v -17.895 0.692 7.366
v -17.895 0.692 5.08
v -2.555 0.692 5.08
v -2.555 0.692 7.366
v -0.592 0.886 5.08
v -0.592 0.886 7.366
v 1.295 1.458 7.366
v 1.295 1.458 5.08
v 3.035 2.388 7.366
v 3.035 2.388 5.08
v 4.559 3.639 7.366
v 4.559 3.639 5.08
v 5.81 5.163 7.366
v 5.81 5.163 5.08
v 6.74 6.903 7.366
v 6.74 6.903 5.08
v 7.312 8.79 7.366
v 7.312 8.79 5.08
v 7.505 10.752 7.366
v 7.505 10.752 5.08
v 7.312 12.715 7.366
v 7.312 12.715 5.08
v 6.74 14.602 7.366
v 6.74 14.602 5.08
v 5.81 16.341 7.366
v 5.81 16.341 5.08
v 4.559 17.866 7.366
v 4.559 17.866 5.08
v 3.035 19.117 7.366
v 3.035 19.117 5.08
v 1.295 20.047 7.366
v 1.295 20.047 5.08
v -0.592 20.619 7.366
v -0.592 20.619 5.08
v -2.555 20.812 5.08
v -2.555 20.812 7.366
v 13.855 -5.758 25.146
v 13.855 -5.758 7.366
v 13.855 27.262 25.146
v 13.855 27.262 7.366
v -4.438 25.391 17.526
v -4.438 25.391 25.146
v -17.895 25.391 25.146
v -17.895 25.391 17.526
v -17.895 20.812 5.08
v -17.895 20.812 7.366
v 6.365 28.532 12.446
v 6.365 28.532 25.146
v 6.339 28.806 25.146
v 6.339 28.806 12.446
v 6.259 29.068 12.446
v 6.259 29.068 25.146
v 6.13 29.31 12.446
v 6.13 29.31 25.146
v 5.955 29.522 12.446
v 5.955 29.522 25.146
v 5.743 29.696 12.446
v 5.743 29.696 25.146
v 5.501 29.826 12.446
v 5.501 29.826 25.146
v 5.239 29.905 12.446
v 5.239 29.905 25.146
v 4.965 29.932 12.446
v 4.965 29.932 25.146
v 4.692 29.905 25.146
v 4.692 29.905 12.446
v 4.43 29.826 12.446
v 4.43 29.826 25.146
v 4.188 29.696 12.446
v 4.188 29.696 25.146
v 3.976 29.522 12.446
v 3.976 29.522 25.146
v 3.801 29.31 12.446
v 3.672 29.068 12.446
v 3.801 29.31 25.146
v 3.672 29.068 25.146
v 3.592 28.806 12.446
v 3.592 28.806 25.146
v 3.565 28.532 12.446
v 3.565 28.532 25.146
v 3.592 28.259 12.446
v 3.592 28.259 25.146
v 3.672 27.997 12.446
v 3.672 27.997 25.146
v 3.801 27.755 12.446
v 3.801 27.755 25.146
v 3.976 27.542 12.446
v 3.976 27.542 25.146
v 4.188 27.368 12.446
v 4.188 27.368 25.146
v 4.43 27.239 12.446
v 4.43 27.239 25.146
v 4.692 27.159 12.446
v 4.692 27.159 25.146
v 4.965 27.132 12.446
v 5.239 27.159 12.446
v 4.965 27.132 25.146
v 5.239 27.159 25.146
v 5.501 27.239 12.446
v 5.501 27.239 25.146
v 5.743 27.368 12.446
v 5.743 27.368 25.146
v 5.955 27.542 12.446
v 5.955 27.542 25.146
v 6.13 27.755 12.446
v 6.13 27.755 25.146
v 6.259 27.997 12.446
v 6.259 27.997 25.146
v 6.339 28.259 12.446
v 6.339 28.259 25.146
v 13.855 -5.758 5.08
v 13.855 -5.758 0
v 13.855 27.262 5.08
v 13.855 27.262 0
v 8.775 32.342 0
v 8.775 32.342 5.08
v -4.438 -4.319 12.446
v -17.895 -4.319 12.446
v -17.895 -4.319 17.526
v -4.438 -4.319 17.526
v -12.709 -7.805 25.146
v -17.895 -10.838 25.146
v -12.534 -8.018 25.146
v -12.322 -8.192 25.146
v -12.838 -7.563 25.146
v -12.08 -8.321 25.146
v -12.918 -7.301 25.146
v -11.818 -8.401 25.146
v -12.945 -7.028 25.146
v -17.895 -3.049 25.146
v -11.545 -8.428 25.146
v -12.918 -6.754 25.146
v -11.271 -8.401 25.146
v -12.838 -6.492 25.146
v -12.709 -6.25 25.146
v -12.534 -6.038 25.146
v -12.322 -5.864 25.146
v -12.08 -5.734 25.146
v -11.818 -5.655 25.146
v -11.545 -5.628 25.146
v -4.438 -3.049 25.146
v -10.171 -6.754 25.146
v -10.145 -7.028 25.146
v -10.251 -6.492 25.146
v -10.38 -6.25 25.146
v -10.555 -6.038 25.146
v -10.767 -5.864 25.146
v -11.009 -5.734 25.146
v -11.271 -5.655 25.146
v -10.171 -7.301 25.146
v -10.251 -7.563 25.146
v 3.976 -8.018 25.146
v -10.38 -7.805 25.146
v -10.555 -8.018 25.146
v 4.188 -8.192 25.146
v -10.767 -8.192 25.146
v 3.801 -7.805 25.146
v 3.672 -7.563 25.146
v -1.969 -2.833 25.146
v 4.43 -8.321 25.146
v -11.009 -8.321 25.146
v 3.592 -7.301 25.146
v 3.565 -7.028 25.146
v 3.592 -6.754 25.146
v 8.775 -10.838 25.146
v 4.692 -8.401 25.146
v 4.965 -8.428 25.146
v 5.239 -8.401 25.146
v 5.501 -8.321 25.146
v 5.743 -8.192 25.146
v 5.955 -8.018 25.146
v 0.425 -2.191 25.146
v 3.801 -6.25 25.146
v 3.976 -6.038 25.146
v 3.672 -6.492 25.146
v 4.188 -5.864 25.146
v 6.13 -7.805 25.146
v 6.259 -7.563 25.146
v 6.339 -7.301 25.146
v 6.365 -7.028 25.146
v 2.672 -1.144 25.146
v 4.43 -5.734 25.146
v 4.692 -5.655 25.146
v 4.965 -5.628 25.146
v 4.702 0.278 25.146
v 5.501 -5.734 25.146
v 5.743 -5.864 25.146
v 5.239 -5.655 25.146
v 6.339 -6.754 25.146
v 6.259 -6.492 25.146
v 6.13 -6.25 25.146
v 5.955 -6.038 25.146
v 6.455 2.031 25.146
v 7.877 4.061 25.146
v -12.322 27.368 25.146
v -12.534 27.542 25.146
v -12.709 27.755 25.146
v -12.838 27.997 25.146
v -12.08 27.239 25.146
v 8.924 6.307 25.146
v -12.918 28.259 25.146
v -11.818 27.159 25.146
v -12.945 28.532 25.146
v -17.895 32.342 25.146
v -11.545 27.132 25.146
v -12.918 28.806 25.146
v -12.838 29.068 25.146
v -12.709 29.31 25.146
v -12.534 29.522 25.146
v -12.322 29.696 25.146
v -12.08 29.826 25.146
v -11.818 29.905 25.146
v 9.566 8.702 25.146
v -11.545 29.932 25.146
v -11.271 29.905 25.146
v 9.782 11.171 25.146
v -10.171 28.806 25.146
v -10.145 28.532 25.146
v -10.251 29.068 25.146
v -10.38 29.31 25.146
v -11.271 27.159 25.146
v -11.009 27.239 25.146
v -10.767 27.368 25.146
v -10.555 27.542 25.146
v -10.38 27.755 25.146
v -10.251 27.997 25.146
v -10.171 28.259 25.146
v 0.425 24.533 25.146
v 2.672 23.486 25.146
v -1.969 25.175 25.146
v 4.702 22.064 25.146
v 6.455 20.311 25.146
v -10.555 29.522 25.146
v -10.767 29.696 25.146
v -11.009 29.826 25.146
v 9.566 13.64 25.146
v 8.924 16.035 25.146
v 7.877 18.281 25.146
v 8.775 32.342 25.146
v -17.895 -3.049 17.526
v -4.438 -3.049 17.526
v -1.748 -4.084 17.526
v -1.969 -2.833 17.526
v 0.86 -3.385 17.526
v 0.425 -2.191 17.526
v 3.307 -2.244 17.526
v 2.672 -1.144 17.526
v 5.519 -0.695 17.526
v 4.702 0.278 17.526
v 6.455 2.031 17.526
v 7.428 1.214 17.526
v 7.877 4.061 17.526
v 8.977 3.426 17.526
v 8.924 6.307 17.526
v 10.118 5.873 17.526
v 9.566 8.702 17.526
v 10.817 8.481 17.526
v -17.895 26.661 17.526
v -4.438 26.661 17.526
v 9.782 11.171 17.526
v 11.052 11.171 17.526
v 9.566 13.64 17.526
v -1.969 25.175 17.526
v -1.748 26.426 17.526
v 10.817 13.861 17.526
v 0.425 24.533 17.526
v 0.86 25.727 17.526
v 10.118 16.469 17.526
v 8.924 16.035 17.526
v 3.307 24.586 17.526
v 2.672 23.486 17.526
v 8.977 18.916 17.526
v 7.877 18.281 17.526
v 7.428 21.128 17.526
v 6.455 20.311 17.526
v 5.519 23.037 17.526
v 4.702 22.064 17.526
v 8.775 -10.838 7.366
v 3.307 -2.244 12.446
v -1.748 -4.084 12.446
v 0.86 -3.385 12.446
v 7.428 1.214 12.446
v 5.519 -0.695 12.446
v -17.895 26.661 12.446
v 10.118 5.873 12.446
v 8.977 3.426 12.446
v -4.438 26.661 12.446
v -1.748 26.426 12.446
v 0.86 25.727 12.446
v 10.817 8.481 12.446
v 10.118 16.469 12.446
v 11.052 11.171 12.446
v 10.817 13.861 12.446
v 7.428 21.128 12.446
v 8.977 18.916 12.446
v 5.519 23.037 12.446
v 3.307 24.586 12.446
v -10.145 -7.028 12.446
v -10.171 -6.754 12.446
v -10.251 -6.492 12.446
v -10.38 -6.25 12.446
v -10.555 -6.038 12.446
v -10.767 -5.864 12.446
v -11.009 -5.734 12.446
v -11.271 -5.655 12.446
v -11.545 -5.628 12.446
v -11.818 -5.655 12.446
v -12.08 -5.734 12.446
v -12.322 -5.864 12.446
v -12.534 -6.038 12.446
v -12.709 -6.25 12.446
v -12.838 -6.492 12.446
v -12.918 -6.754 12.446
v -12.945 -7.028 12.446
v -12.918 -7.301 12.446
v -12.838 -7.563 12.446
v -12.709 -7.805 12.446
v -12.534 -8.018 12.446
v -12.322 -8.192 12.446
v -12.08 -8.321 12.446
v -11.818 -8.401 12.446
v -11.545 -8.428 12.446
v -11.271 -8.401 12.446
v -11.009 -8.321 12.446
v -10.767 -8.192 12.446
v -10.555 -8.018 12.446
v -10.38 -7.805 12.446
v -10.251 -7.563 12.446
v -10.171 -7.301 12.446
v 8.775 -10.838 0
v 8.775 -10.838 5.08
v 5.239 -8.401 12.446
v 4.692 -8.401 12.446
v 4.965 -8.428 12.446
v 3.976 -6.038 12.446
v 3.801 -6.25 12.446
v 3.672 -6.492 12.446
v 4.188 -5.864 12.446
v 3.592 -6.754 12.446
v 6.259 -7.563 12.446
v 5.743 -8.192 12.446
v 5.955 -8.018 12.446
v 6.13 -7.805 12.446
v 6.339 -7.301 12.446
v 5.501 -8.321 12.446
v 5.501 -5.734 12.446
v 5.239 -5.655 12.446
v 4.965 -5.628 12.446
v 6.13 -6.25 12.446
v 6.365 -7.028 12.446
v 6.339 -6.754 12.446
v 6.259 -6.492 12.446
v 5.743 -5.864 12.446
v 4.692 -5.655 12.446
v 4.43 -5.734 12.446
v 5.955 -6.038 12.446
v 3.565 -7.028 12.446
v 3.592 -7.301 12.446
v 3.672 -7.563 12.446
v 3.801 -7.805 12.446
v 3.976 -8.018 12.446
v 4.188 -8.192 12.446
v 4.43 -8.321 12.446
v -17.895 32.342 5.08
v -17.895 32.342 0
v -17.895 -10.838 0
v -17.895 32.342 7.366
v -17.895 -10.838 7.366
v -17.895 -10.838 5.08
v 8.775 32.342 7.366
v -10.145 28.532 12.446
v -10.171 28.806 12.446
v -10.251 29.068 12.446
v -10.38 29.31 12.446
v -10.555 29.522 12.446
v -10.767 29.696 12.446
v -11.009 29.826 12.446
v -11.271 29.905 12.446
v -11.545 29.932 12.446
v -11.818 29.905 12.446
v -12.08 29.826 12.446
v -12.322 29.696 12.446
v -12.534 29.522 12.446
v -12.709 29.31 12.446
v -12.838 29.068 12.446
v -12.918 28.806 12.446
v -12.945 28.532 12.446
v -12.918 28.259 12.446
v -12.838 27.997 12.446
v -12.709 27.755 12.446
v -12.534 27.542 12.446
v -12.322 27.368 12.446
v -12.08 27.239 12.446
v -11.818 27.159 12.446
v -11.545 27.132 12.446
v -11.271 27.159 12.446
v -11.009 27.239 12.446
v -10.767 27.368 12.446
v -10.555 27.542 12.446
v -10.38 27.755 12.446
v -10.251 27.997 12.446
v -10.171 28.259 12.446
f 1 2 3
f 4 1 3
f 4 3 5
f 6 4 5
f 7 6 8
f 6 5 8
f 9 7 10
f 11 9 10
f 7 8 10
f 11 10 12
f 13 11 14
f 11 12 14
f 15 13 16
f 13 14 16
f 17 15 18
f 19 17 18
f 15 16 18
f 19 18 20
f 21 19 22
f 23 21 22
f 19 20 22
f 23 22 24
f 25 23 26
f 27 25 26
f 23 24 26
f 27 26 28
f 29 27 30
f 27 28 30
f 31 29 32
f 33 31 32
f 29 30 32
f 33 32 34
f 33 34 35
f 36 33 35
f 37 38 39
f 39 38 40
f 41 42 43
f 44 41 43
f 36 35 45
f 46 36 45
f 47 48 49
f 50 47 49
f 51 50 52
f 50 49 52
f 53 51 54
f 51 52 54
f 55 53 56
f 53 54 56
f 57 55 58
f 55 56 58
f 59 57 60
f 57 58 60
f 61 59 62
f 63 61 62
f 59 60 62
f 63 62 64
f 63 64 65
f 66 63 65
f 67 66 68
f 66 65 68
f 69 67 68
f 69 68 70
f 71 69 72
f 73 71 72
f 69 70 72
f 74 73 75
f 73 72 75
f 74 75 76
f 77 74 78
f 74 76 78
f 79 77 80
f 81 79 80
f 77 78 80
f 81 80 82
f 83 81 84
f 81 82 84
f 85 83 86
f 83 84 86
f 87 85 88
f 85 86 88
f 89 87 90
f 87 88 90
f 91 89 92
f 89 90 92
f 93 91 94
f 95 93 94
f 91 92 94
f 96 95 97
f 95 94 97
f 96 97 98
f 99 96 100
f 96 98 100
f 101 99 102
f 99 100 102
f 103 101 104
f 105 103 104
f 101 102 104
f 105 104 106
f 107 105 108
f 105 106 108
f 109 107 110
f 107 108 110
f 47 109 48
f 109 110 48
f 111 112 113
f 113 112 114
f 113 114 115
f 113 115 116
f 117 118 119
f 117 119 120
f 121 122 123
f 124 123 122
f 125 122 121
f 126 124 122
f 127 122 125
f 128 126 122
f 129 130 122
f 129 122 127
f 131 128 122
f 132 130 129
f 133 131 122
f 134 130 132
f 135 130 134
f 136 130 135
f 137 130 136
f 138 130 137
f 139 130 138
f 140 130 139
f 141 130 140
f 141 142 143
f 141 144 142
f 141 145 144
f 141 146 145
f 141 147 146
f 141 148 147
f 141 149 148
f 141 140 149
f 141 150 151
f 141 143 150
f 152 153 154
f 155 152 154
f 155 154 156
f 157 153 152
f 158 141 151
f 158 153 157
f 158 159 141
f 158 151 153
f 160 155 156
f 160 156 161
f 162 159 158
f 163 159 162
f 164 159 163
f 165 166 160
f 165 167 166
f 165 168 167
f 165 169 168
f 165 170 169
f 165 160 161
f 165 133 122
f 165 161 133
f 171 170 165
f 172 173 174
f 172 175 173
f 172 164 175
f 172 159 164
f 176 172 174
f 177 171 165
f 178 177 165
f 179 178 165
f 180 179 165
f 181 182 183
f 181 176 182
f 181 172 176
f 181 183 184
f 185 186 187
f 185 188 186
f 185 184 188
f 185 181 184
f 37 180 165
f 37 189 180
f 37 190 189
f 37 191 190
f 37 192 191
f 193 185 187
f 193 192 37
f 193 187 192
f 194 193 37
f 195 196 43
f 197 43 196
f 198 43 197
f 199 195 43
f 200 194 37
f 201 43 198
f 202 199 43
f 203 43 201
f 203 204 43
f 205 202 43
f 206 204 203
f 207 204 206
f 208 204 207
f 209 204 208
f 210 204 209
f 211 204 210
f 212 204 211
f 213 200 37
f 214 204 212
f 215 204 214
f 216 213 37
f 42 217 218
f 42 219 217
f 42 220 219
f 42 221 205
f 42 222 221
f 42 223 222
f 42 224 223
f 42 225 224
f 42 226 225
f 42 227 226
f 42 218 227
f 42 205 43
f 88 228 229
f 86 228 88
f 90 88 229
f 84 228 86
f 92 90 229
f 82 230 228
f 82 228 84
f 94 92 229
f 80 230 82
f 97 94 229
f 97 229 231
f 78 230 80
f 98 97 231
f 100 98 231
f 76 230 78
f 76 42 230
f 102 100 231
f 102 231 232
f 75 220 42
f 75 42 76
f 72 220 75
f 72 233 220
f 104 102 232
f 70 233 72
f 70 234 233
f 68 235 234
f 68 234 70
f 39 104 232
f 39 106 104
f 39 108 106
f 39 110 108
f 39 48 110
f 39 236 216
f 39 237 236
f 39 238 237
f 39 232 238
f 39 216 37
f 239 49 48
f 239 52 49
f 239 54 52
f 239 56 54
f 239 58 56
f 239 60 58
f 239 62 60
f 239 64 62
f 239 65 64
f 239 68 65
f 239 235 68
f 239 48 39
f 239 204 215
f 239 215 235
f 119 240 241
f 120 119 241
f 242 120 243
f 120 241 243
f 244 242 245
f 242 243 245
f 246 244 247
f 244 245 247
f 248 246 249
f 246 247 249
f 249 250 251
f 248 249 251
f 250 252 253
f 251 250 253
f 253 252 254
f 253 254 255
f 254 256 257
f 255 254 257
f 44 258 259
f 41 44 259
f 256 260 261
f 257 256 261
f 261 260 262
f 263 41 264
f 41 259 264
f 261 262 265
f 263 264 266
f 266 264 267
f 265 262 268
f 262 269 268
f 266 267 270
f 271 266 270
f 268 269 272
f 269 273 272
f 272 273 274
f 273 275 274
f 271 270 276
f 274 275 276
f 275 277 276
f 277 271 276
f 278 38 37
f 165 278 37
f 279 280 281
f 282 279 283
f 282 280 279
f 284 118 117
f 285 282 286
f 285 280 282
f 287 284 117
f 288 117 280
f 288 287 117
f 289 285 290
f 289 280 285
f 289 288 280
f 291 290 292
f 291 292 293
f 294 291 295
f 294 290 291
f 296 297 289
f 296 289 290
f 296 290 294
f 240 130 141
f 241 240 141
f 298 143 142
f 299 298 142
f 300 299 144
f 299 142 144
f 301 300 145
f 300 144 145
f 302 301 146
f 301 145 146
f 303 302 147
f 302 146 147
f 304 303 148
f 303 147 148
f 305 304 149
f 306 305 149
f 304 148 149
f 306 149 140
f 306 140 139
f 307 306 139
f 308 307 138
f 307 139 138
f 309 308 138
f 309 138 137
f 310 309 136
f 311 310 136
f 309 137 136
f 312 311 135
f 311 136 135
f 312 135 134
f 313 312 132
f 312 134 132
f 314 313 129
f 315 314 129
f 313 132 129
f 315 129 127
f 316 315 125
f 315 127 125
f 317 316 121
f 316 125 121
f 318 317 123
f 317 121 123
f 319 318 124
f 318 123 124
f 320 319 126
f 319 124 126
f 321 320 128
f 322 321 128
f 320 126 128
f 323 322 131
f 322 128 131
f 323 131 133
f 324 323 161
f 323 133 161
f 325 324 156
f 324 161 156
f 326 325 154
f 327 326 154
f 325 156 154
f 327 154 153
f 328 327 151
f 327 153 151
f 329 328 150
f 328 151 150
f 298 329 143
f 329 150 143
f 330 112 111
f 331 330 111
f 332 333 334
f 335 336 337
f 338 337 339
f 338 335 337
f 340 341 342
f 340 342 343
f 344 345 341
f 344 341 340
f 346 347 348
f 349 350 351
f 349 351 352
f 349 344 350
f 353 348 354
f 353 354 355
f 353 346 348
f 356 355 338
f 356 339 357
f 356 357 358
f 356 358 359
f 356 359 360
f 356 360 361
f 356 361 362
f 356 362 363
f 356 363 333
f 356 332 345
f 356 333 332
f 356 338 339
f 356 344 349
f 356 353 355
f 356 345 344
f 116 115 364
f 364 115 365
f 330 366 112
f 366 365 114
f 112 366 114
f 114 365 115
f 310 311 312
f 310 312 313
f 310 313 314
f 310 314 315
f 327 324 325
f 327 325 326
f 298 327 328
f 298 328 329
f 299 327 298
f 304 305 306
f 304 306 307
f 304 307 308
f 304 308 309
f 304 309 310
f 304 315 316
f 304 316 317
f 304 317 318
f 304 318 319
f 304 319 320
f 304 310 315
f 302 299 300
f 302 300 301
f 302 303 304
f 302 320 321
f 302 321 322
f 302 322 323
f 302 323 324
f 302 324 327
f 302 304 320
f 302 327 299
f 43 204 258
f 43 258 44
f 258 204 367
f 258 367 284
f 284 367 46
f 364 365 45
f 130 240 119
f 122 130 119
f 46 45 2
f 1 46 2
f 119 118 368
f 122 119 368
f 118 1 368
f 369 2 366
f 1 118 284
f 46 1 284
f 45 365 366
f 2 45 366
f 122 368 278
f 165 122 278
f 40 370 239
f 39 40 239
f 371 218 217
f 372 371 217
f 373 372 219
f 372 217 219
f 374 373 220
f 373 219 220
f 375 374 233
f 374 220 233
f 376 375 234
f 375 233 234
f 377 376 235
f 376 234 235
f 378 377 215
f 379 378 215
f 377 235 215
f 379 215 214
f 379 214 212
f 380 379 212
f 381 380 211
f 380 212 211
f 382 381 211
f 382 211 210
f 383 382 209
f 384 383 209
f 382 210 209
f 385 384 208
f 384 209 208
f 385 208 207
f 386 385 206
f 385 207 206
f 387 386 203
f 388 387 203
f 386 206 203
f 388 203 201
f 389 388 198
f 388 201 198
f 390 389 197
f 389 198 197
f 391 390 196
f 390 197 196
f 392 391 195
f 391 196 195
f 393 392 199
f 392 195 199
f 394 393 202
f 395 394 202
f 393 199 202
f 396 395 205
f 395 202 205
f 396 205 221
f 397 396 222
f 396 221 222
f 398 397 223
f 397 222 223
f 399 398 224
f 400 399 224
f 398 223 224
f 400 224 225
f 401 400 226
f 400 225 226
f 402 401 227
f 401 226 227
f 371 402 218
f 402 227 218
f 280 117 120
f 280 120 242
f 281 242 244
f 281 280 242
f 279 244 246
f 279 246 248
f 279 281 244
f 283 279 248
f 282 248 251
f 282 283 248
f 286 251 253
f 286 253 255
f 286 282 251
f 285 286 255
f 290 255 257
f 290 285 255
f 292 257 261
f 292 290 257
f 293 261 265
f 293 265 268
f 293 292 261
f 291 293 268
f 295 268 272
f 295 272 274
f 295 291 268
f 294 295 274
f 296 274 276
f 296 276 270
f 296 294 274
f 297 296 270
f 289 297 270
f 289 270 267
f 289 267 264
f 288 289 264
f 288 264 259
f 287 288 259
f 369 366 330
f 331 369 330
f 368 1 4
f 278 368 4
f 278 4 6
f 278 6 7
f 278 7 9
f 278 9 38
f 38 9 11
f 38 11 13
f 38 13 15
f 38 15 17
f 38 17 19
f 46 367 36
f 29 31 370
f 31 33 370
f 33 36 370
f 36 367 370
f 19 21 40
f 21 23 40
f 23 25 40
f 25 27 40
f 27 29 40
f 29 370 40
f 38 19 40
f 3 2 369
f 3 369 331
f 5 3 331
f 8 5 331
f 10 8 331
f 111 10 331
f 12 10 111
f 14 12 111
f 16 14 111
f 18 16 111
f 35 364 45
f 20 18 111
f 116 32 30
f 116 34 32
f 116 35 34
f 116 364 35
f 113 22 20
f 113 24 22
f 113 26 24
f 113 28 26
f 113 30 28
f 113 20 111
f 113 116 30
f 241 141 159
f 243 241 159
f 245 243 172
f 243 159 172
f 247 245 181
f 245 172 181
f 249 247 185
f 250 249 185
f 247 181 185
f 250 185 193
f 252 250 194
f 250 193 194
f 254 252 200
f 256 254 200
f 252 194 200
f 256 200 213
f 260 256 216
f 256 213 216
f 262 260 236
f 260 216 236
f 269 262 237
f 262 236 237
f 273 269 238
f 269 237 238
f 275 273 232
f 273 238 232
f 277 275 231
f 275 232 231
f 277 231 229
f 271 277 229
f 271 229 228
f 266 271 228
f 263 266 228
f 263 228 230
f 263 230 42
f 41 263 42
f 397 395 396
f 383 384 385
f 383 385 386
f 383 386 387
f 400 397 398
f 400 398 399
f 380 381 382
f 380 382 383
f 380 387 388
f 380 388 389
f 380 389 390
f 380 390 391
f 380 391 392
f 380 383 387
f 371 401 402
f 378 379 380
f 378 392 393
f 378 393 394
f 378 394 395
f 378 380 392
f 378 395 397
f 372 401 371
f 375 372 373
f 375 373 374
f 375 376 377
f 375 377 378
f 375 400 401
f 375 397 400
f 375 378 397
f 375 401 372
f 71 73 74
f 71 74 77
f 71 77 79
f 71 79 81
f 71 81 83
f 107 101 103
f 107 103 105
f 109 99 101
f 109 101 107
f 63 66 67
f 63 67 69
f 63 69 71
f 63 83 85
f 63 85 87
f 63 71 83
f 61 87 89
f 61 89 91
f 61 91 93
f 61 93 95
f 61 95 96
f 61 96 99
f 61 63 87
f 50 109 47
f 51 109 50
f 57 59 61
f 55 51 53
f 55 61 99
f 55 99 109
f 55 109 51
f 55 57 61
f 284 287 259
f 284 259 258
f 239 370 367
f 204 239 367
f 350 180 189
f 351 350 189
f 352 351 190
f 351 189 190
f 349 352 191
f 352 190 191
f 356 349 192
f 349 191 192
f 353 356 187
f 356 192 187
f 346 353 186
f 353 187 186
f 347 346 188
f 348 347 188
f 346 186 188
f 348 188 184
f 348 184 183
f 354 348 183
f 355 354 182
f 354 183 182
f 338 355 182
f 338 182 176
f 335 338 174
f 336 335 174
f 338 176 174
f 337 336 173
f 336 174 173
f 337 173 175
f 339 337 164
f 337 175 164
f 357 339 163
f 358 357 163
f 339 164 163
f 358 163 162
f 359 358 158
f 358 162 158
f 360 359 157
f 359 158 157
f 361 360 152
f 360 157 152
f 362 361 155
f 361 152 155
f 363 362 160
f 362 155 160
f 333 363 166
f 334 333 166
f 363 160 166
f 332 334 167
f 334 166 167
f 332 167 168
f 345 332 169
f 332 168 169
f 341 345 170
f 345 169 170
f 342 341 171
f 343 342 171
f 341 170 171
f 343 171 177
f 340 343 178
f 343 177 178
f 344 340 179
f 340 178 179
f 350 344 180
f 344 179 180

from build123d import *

# Parameters (mm, degrees)
F1_DEPTH  = 5.08
F3_DEPTH  = 2.286
F5_DEPTH  = 17.78
F6_SIZE   = 5.08
F7_R      = 1.4
F8_DEPTH  = 12.7
F10_DEPTH = 5.08


with BuildPart() as f1:
    # F0 (on Top) → F1 (new body)
    with BuildSketch(Plane.XY):
        Polygon((-17.894535, 19.113216), (-17.894535, 2.39155), (-17.894535, -10.837617), (13.855465, -10.837617), (13.855465, 10.752383), (13.855465, 32.342383), (-17.894535, 32.342383), align=None)
    extrude(amount=F1_DEPTH)

    # F2 (on face) → F3 (join)
    with BuildSketch(Plane.XY.offset(5.08)):
        with BuildLine():
            Line((-2.554535, 20.812383), (-17.894535, 20.812383))
            Line((-17.894535, 20.812383), (-17.894535, 0.692383))
            Line((-17.894535, 0.692383), (-2.554535, 0.692383))
            ThreePointArc((-2.554535, 0.692383), (7.505465, 10.752383), (-2.554535, 20.812383))
        make_face()
    extrude(amount=F3_DEPTH)

    # F4 (on face) → F5 (join)
    with BuildSketch(Plane.XY.offset(7.366)):
        with BuildLine():
            Line((-2.554535, 20.812383), (-17.894535, 20.812383))
            Line((-17.894535, 20.812383), (-17.894535, 0.692383))
            Line((-17.894535, 0.692383), (-2.554535, 0.692383))
            ThreePointArc((-2.554535, 0.692383), (7.505465, 10.752383), (-2.554535, 20.812383))
        make_face()
        with BuildLine():
            Line((13.855465, 32.342383), (-17.894535, 32.342383))
            Line((-17.894535, 32.342383), (-17.894535, 20.812383))
            Line((-17.894535, 20.812383), (-2.554535, 20.812383))
            ThreePointArc((-2.554535, 20.812383), (7.505465, 10.752383), (-2.554535, 0.692383))
            Line((-2.554535, 0.692383), (-17.894535, 0.692383))
            Line((-17.894535, 0.692383), (-17.894535, -10.837617))
            Line((-17.894535, -10.837617), (13.855465, -10.837617))
            Line((13.855465, -10.837617), (13.855465, 32.342383))
        make_face()
    extrude(amount=F5_DEPTH)

    # F6
    f6_edges = [f1.edges().sort_by_distance(p)[0] for p in [
        (13.855465, -10.837617, 16.256),
        (13.855465, -10.837617, 2.54),
        (13.855465, 32.342383, 16.256),
        (13.855465, 32.342383, 2.54),
    ]]
    chamfer(f6_edges, length=F6_SIZE)

    # F7 (on face) → F8 (cut)
    with BuildSketch(Plane.XY.offset(25.146)):
        with BuildLine():
            Line((-4.438033, 25.391014), (-17.894535, 25.391014))
            Line((-17.894535, 25.391014), (-17.894535, -3.048986))
            Line((-17.894535, -3.048986), (-4.438033, -3.048986))
            ThreePointArc((-4.438033, -3.048986), (9.781967, 11.171014), (-4.438033, 25.391014))
        make_face()
        with Locations((-11.544535, 28.532383)):
            Circle(F7_R)
        with Locations((4.965465, 28.532383)):
            Circle(F7_R)
        with Locations((-11.544535, -7.027617)):
            Circle(F7_R)
        with Locations((4.965465, -7.027617)):
            Circle(F7_R)
    extrude(amount=-F8_DEPTH, mode=Mode.SUBTRACT)

    # F9 (on face) → F10 (cut)
    with BuildSketch(Plane.XY.offset(12.446)):
        with BuildLine():
            Line((-4.438033, 26.661014), (-19.164535, 26.661014))
            Line((-19.164535, 26.661014), (-19.164535, -4.318986))
            Line((-19.164535, -4.318986), (-4.438033, -4.318986))
            ThreePointArc((-4.438033, -4.318986), (11.051967, 11.171014), (-4.438033, 26.661014))
        make_face()
    extrude(amount=F10_DEPTH, mode=Mode.SUBTRACT)


solid = f1.part
